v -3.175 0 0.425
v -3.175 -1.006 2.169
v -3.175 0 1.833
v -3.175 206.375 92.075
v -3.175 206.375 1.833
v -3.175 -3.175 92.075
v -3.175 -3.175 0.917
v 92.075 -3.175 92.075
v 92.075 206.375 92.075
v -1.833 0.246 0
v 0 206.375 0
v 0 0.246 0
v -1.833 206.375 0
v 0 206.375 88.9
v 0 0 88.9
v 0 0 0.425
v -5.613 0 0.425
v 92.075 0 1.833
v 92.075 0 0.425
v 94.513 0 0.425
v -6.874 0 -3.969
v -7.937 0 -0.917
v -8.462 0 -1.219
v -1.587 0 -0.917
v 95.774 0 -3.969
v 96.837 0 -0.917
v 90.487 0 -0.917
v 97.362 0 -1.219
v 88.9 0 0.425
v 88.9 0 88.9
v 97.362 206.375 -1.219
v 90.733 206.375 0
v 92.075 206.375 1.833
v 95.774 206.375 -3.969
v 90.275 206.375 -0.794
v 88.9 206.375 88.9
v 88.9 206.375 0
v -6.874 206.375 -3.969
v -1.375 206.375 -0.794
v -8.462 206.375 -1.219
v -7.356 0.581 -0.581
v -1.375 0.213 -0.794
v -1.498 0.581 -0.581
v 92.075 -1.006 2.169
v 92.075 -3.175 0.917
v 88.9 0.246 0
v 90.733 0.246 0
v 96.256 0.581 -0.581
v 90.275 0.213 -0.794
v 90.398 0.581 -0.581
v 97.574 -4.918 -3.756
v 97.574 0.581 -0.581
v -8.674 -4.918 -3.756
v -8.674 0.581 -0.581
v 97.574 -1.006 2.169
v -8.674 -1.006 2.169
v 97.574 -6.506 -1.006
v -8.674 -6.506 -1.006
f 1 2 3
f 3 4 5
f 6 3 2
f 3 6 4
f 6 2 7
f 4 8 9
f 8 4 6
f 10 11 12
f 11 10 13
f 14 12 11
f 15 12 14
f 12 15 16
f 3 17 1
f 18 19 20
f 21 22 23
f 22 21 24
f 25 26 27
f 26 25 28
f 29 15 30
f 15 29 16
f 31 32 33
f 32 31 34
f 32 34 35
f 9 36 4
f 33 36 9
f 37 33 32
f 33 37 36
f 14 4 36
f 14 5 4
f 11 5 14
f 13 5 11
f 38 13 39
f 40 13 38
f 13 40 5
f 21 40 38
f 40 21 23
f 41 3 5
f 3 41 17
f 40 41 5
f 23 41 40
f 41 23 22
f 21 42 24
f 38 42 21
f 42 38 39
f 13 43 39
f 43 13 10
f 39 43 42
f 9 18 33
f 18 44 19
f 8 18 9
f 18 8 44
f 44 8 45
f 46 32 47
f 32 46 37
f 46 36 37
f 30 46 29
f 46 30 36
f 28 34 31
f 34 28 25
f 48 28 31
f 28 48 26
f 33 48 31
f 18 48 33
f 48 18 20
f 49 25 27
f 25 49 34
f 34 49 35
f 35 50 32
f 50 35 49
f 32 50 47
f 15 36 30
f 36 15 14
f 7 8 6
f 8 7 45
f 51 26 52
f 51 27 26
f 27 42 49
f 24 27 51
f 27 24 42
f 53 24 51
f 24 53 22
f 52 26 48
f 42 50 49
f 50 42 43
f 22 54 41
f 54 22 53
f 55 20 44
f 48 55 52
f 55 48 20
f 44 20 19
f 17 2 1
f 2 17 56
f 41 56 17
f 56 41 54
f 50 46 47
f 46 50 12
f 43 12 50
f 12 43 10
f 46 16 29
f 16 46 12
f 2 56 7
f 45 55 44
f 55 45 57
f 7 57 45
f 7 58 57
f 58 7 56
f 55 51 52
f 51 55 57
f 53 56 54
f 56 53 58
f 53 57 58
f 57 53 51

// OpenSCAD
mmPerInch=25.4;

skirt = 3.5;
beamWidth = 3.5;
length = 8;
topThickness = 0.125;
skirtThickness = 0.125;
dripEdgeLength = 0.25;
dripEdgeAngle = 30;
module skirtSide()
{
    cube([skirtThickness, length+skirtThickness, skirt+topThickness], center=false);    
    rotate([0,dripEdgeAngle,0])
        translate([skirtThickness*sin(dripEdgeAngle),0,0])
            cube([dripEdgeLength, length+skirtThickness, skirtThickness], center=false);    
}

scale([mmPerInch, mmPerInch,mmPerInch])
{
    // top
    translate([-skirtThickness,0,skirt])
        cube([beamWidth + 2*skirtThickness, length+skirtThickness, topThickness], center = false);
        
    // long sides    
    translate([0,length+skirtThickness,0])
        rotate([0,0,180])
            skirtSide();
    translate([beamWidth,0,0])
        skirtSide();
    
    // front
    translate([-skirtThickness,-skirtThickness,0])
        cube([beamWidth+2*skirtThickness, skirtThickness, skirt+topThickness], center=false);
    
    translate([-dripEdgeLength*cos(dripEdgeAngle)-skirtThickness,-skirtThickness*sin(dripEdgeAngle),0])
        rotate([dripEdgeAngle, 0,0])
            translate([0,-(dripEdgeLength-skirtThickness*sin(dripEdgeAngle)),-skirtThickness*sin(dripEdgeAngle)])
                cube([beamWidth+2*skirtThickness+2*(dripEdgeLength*cos(dripEdgeAngle)), dripEdgeLength, skirtThickness], center=false);    
    
}
